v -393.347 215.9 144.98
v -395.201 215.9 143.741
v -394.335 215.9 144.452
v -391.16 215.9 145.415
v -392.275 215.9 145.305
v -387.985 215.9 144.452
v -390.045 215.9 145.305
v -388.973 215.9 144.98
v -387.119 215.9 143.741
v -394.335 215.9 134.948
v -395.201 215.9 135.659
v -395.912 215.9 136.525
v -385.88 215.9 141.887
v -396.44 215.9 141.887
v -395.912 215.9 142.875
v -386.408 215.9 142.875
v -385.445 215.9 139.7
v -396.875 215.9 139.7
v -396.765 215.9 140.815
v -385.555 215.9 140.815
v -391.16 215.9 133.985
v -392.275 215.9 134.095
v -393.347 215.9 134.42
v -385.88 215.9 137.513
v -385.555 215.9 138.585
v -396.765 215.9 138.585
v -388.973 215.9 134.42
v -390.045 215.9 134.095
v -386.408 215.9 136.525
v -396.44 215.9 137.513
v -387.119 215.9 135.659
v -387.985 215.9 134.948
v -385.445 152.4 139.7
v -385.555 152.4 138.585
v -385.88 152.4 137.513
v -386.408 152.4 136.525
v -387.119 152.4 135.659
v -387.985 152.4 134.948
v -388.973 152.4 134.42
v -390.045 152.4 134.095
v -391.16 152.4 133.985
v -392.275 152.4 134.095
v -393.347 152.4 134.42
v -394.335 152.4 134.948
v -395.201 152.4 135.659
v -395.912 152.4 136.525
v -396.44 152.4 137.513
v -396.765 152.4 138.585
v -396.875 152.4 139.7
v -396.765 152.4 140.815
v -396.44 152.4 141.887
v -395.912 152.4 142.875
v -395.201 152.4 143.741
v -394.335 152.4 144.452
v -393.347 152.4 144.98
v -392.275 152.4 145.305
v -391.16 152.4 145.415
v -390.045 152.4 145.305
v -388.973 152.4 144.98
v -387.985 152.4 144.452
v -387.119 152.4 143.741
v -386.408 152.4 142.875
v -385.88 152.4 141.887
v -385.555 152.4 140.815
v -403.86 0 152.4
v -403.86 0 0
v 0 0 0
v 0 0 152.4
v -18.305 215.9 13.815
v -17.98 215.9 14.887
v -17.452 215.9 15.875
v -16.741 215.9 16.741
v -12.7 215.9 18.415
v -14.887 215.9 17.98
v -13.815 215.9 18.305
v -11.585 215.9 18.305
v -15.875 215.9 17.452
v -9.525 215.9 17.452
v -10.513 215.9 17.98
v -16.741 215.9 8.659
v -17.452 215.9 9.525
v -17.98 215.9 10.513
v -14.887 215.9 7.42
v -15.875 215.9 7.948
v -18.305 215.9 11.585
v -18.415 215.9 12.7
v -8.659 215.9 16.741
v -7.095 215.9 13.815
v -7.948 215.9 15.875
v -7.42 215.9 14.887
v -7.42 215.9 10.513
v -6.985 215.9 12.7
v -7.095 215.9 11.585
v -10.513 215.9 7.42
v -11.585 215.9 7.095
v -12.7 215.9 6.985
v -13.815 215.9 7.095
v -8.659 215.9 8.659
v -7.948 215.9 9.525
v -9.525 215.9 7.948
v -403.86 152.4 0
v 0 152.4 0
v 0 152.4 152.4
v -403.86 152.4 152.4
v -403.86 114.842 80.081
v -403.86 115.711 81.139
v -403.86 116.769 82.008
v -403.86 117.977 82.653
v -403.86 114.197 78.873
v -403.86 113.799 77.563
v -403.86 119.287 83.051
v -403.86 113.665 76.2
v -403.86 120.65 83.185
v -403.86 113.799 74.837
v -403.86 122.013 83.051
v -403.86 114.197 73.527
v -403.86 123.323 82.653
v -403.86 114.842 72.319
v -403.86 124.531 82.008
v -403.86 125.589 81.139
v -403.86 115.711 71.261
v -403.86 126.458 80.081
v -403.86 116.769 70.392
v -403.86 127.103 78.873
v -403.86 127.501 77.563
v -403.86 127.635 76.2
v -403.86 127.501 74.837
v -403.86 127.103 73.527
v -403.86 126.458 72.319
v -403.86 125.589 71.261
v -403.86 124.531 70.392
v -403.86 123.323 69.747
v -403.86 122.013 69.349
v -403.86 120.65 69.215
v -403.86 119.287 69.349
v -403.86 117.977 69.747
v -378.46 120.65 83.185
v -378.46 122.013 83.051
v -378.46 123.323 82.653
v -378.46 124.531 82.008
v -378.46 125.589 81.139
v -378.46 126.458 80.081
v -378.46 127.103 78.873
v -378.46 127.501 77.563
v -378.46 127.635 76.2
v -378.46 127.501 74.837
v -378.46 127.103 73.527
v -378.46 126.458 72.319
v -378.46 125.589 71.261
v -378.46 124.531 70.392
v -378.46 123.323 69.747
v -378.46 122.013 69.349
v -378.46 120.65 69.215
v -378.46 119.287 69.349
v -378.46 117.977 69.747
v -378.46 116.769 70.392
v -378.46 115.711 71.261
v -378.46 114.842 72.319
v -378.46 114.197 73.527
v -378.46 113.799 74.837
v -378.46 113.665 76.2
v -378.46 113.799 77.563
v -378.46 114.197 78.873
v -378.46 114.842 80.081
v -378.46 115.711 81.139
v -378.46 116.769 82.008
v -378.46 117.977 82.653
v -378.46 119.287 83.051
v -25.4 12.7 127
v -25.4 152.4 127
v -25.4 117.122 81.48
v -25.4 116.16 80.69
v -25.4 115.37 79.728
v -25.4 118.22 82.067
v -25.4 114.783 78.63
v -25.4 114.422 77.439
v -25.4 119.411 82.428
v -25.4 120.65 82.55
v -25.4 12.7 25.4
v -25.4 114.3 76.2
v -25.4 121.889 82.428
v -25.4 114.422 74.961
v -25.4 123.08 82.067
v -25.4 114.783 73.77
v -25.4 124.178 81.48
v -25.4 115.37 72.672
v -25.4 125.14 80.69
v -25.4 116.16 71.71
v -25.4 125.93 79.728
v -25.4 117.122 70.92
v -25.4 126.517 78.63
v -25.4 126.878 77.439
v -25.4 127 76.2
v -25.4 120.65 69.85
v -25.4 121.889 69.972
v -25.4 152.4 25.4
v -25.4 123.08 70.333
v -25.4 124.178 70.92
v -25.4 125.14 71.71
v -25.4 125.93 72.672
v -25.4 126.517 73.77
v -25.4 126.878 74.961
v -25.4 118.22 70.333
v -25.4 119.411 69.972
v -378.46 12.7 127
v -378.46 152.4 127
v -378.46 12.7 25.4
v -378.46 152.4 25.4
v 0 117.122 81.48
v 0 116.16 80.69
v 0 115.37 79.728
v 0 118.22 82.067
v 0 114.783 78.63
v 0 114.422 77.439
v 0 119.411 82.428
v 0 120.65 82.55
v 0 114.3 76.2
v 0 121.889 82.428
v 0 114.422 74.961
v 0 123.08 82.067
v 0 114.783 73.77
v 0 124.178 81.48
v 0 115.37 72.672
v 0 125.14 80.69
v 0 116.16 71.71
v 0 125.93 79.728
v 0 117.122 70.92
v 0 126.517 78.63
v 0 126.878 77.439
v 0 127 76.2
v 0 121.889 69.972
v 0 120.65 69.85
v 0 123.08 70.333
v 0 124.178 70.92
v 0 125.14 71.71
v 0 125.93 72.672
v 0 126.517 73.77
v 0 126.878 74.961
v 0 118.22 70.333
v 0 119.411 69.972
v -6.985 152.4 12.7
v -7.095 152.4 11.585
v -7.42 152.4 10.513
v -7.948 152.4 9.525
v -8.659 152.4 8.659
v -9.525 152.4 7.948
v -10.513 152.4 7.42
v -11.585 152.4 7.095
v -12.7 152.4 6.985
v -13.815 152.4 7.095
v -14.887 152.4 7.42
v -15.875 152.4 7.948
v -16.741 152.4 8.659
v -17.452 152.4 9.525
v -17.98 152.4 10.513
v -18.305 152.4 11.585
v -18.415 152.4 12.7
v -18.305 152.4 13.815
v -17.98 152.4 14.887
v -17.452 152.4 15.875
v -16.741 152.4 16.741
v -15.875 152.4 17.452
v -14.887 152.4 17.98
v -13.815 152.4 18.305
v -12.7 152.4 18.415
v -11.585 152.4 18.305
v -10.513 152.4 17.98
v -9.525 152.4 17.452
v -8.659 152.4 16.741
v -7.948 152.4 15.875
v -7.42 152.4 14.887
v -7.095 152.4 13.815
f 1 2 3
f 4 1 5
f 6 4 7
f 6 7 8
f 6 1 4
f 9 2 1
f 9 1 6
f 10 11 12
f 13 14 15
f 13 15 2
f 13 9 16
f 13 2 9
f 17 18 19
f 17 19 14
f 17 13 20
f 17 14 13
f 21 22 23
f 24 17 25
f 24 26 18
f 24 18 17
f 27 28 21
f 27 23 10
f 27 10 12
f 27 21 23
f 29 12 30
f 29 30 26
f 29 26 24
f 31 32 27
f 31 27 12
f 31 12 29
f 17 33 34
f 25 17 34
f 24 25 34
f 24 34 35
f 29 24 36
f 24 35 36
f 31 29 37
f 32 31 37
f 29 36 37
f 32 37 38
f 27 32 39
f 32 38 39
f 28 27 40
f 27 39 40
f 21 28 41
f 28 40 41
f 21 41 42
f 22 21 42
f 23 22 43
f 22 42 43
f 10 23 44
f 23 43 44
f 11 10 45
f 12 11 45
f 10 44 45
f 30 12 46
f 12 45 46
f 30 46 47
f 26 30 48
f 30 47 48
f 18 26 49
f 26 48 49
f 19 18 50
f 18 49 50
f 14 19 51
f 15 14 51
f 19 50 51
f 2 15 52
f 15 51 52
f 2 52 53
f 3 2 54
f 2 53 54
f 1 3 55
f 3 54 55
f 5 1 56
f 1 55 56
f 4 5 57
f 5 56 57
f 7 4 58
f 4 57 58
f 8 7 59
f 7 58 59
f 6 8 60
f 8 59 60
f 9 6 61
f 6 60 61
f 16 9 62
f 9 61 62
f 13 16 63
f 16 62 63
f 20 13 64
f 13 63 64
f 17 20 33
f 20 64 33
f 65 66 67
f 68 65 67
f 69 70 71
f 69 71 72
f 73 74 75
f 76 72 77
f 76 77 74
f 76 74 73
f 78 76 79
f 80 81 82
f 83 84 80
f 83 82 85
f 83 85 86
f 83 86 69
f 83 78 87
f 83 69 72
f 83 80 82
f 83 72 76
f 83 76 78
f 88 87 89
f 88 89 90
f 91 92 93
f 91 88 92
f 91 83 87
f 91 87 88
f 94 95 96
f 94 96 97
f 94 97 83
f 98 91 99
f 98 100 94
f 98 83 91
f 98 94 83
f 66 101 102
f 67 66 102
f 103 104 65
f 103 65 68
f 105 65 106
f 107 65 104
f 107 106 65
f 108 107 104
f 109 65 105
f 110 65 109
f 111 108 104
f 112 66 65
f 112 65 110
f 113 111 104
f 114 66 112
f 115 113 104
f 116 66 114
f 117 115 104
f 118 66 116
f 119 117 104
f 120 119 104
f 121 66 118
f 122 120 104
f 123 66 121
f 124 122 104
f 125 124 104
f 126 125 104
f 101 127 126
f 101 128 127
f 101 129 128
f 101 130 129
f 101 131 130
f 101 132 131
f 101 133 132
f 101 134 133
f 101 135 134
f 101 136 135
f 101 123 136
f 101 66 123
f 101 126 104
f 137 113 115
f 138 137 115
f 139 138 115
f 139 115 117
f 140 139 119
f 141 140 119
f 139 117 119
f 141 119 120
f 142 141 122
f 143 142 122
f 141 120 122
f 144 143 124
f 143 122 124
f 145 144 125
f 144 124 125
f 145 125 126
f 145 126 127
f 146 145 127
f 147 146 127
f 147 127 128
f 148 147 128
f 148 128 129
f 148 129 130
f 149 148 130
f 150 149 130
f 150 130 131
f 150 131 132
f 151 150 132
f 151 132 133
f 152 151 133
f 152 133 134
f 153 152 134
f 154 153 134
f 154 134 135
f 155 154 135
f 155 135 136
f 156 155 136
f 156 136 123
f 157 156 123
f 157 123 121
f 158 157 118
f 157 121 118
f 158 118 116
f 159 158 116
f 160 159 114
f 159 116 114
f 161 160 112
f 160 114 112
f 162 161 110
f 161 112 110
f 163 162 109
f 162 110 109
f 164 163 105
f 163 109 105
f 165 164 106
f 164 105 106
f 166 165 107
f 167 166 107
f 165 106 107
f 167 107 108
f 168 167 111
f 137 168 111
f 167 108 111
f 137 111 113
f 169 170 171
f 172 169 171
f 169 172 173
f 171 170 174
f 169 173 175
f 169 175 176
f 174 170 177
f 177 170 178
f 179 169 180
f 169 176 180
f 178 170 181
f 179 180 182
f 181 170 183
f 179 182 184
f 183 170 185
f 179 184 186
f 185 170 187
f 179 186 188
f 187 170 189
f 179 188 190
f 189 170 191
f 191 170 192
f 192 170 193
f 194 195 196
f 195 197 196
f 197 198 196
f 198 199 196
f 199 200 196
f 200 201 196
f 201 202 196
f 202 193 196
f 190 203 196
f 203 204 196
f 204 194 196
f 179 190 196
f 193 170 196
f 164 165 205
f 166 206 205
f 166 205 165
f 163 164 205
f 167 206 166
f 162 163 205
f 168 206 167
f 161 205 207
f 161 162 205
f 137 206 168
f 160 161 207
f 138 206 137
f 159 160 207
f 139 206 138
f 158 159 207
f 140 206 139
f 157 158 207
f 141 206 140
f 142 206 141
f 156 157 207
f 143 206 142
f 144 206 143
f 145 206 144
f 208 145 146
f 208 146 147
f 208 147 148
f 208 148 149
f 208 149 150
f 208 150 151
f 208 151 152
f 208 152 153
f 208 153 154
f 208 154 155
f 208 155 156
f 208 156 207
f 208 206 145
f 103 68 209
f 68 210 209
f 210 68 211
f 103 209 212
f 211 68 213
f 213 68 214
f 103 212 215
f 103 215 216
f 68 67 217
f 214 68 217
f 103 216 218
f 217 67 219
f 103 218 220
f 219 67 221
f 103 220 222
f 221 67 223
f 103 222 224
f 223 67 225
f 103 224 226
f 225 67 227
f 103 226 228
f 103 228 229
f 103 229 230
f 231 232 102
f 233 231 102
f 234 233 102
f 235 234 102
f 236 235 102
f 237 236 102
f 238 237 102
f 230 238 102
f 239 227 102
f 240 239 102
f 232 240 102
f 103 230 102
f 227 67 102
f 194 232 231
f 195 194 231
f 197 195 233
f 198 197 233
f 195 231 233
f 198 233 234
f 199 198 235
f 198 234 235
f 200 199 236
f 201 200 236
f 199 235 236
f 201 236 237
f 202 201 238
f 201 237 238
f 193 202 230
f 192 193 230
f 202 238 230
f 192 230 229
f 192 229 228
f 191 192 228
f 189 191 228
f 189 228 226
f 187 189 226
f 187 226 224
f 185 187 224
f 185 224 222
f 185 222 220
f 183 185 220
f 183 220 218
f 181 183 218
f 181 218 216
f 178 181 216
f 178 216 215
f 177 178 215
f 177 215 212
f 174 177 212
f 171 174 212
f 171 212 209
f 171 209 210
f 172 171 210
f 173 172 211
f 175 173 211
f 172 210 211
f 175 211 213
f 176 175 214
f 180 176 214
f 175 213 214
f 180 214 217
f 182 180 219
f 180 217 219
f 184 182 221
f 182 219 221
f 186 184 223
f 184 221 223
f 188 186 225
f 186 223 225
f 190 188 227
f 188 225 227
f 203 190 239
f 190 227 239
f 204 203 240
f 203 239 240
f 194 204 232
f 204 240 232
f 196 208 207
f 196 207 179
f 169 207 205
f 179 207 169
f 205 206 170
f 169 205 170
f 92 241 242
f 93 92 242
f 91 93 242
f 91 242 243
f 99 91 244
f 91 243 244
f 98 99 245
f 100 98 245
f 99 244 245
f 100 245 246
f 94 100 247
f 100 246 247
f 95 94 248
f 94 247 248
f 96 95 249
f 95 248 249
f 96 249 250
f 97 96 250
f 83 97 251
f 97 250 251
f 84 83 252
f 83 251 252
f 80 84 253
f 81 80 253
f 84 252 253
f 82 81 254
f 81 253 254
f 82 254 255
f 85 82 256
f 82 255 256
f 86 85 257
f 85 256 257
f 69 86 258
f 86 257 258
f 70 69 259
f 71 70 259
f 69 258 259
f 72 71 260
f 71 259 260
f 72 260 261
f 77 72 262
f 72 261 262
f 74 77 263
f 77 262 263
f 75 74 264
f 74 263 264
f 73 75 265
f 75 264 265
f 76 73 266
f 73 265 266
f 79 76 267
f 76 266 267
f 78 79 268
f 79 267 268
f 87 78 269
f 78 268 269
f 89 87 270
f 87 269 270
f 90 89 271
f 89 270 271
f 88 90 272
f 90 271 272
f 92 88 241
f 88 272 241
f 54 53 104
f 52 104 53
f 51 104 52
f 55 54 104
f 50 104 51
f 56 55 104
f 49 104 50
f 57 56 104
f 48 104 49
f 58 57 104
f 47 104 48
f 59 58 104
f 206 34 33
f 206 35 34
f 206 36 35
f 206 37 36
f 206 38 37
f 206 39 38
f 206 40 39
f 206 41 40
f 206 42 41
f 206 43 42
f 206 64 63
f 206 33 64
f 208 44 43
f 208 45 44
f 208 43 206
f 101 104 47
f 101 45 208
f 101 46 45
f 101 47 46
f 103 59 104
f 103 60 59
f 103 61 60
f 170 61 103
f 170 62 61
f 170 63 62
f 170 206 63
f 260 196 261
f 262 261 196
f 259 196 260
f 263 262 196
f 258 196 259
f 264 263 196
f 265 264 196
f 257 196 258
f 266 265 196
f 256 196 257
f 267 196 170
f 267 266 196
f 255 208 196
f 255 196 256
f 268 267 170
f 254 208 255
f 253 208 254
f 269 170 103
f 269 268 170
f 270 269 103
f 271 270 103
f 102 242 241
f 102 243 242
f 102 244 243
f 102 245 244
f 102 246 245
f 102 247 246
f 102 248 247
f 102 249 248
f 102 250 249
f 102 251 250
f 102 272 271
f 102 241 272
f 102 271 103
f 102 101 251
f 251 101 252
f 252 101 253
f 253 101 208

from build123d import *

# Parameters (mm, degrees)
SKETCH1_W           = 403.86
SKETCH1_H           = 152.4
BOSS_EXTRUDE1_DEPTH = 152.4
SKETCH3_W           = 353.06
SKETCH3_H           = 101.6
CUT_EXTRUDE1_DEPTH  = 139.7
SKETCH4_R           = 5.715
BOSS_EXTRUDE2_DEPTH = 63.5
SKETCH5_R           = 6.35
CUT_EXTRUDE2_DEPTH  = 63.5
CUT_EXTRUDE3_REACH  = 405.86
SKETCH6_R           = 6.985
SKETCH7_R           = 5.715
BOSS_EXTRUDE3_DEPTH = 63.5


with BuildPart() as part:
    # Sketch1 → Boss-Extrude1 (new body)
    with BuildSketch(Plane.XY):
        with Locations((-201.93, 76.2)):
            Rectangle(SKETCH1_W, SKETCH1_H)
    extrude(amount=BOSS_EXTRUDE1_DEPTH)

    # Sketch3 → Cut-Extrude1 (cut)
    with BuildSketch(Plane(origin=(0, 152.4, 0), x_dir=(1, 0, 0), z_dir=(0, 1, 0))):
        with Locations((-201.93, -76.2)):
            Rectangle(SKETCH3_W, SKETCH3_H)
    extrude(amount=-CUT_EXTRUDE1_DEPTH, mode=Mode.SUBTRACT)

    # Sketch4 → Boss-Extrude2 (add)
    with BuildSketch(Plane(origin=(0, 152.4, 0), x_dir=(1, 0, 0), z_dir=(0, 1, 0))):
        with Locations((-391.16, -139.7)):
            Circle(SKETCH4_R)
    extrude(amount=BOSS_EXTRUDE2_DEPTH)

    # Sketch5 → Cut-Extrude2 (cut)
    with BuildSketch(Plane(origin=(0, 0, 0), x_dir=(0, 0, -1), z_dir=(1, 0, 0))):
        with Locations((-76.2, 120.65)):
            Circle(SKETCH5_R)
    extrude(amount=-CUT_EXTRUDE2_DEPTH, mode=Mode.SUBTRACT)

    # Sketch6 → Cut-Extrude3 (cut, up to next)
    with BuildSketch(Plane.ZY.offset(403.86), mode=Mode.PRIVATE) as cut_extrude3_sk1:
        with Locations((76.2, 120.65)):
            Circle(SKETCH6_R)
    cut_extrude3_tool1 = extrude(cut_extrude3_sk1.sketch, amount=-CUT_EXTRUDE3_REACH, mode=Mode.PRIVATE) & part.part
    add(cut_extrude3_tool1.solids().sort_by_distance((-403.86, 120.65, 76.2))[0], mode=Mode.SUBTRACT)

    # Sketch7 → Boss-Extrude3 (add)
    with BuildSketch(Plane(origin=(0, 152.4, 0), x_dir=(1, 0, 0), z_dir=(0, 1, 0))):
        with Locations((-12.7, -12.7)):
            Circle(SKETCH7_R)
    extrude(amount=BOSS_EXTRUDE3_DEPTH)


solid = part.part
